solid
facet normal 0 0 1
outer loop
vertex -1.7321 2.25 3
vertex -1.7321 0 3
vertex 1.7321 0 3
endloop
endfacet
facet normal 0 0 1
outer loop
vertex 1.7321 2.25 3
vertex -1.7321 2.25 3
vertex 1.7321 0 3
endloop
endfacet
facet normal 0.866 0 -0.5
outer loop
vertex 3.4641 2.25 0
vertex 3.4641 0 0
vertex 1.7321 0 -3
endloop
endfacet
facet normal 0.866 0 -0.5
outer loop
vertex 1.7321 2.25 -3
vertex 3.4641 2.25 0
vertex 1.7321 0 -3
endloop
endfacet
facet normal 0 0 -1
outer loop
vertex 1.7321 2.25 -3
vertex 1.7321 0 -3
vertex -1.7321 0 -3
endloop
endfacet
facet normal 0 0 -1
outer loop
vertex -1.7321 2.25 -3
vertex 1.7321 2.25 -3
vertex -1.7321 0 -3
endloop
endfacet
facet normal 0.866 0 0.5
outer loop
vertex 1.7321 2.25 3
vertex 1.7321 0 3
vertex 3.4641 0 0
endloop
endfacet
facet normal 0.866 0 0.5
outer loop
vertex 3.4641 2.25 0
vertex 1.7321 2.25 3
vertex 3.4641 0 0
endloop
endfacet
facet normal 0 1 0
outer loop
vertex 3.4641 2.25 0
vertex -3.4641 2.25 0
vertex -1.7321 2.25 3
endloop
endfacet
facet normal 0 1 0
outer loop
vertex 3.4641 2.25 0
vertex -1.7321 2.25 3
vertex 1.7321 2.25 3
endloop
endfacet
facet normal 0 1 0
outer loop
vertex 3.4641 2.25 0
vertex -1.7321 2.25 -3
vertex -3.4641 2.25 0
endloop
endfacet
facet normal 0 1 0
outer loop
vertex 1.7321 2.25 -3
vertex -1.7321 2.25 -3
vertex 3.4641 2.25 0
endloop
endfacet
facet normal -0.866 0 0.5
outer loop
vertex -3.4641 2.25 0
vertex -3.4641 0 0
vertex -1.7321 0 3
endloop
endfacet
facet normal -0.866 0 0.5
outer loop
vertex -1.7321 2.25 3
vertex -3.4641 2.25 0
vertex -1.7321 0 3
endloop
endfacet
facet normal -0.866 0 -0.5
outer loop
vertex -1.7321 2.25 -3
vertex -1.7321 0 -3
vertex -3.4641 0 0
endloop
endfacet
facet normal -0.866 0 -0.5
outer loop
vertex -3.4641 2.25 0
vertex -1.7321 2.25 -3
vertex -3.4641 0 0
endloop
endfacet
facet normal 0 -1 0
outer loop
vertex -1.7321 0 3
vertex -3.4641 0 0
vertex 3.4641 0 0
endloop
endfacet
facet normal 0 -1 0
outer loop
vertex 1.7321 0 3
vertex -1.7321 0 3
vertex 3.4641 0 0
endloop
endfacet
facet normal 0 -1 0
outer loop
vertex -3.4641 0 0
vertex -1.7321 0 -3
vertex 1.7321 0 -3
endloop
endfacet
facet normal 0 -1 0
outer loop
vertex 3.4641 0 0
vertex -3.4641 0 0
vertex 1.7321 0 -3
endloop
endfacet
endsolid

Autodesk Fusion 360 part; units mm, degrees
sketch "Sketch1" plane through (0, 0, 0) normal (0, 1, 0) x (1, 0, 0)
  line L0 (-1.7321, -3) -> (1.7321, -3)
  line L1 (1.7321, -3) -> (3.4641, 0)
  line L2 (3.4641, 0) -> (1.7321, 3)
  line L3 (1.7321, 3) -> (-1.7321, 3)
  line L4 (-1.7321, 3) -> (-3.4641, 0)
  line L5 (-3.4641, 0) -> (-1.7321, -3)
  line L6 (-1.7321, -3) -> (1.7321, 3)
  line L7 (-1.7321, 3) -> (1.7321, -3)
  line L8 (3.4641, 0) -> (-3.4641, 0)
  dimension "d1" = 120
  dimension "d2" = 120
  dimension "d3" = 6
  dimension "d4" = 6
  dimension "d5" = 6
extrude "Extrude1" add sketch "Sketch1" along normal blind 2.25
equation "d3 = d4"
equation "d5 = d4"
